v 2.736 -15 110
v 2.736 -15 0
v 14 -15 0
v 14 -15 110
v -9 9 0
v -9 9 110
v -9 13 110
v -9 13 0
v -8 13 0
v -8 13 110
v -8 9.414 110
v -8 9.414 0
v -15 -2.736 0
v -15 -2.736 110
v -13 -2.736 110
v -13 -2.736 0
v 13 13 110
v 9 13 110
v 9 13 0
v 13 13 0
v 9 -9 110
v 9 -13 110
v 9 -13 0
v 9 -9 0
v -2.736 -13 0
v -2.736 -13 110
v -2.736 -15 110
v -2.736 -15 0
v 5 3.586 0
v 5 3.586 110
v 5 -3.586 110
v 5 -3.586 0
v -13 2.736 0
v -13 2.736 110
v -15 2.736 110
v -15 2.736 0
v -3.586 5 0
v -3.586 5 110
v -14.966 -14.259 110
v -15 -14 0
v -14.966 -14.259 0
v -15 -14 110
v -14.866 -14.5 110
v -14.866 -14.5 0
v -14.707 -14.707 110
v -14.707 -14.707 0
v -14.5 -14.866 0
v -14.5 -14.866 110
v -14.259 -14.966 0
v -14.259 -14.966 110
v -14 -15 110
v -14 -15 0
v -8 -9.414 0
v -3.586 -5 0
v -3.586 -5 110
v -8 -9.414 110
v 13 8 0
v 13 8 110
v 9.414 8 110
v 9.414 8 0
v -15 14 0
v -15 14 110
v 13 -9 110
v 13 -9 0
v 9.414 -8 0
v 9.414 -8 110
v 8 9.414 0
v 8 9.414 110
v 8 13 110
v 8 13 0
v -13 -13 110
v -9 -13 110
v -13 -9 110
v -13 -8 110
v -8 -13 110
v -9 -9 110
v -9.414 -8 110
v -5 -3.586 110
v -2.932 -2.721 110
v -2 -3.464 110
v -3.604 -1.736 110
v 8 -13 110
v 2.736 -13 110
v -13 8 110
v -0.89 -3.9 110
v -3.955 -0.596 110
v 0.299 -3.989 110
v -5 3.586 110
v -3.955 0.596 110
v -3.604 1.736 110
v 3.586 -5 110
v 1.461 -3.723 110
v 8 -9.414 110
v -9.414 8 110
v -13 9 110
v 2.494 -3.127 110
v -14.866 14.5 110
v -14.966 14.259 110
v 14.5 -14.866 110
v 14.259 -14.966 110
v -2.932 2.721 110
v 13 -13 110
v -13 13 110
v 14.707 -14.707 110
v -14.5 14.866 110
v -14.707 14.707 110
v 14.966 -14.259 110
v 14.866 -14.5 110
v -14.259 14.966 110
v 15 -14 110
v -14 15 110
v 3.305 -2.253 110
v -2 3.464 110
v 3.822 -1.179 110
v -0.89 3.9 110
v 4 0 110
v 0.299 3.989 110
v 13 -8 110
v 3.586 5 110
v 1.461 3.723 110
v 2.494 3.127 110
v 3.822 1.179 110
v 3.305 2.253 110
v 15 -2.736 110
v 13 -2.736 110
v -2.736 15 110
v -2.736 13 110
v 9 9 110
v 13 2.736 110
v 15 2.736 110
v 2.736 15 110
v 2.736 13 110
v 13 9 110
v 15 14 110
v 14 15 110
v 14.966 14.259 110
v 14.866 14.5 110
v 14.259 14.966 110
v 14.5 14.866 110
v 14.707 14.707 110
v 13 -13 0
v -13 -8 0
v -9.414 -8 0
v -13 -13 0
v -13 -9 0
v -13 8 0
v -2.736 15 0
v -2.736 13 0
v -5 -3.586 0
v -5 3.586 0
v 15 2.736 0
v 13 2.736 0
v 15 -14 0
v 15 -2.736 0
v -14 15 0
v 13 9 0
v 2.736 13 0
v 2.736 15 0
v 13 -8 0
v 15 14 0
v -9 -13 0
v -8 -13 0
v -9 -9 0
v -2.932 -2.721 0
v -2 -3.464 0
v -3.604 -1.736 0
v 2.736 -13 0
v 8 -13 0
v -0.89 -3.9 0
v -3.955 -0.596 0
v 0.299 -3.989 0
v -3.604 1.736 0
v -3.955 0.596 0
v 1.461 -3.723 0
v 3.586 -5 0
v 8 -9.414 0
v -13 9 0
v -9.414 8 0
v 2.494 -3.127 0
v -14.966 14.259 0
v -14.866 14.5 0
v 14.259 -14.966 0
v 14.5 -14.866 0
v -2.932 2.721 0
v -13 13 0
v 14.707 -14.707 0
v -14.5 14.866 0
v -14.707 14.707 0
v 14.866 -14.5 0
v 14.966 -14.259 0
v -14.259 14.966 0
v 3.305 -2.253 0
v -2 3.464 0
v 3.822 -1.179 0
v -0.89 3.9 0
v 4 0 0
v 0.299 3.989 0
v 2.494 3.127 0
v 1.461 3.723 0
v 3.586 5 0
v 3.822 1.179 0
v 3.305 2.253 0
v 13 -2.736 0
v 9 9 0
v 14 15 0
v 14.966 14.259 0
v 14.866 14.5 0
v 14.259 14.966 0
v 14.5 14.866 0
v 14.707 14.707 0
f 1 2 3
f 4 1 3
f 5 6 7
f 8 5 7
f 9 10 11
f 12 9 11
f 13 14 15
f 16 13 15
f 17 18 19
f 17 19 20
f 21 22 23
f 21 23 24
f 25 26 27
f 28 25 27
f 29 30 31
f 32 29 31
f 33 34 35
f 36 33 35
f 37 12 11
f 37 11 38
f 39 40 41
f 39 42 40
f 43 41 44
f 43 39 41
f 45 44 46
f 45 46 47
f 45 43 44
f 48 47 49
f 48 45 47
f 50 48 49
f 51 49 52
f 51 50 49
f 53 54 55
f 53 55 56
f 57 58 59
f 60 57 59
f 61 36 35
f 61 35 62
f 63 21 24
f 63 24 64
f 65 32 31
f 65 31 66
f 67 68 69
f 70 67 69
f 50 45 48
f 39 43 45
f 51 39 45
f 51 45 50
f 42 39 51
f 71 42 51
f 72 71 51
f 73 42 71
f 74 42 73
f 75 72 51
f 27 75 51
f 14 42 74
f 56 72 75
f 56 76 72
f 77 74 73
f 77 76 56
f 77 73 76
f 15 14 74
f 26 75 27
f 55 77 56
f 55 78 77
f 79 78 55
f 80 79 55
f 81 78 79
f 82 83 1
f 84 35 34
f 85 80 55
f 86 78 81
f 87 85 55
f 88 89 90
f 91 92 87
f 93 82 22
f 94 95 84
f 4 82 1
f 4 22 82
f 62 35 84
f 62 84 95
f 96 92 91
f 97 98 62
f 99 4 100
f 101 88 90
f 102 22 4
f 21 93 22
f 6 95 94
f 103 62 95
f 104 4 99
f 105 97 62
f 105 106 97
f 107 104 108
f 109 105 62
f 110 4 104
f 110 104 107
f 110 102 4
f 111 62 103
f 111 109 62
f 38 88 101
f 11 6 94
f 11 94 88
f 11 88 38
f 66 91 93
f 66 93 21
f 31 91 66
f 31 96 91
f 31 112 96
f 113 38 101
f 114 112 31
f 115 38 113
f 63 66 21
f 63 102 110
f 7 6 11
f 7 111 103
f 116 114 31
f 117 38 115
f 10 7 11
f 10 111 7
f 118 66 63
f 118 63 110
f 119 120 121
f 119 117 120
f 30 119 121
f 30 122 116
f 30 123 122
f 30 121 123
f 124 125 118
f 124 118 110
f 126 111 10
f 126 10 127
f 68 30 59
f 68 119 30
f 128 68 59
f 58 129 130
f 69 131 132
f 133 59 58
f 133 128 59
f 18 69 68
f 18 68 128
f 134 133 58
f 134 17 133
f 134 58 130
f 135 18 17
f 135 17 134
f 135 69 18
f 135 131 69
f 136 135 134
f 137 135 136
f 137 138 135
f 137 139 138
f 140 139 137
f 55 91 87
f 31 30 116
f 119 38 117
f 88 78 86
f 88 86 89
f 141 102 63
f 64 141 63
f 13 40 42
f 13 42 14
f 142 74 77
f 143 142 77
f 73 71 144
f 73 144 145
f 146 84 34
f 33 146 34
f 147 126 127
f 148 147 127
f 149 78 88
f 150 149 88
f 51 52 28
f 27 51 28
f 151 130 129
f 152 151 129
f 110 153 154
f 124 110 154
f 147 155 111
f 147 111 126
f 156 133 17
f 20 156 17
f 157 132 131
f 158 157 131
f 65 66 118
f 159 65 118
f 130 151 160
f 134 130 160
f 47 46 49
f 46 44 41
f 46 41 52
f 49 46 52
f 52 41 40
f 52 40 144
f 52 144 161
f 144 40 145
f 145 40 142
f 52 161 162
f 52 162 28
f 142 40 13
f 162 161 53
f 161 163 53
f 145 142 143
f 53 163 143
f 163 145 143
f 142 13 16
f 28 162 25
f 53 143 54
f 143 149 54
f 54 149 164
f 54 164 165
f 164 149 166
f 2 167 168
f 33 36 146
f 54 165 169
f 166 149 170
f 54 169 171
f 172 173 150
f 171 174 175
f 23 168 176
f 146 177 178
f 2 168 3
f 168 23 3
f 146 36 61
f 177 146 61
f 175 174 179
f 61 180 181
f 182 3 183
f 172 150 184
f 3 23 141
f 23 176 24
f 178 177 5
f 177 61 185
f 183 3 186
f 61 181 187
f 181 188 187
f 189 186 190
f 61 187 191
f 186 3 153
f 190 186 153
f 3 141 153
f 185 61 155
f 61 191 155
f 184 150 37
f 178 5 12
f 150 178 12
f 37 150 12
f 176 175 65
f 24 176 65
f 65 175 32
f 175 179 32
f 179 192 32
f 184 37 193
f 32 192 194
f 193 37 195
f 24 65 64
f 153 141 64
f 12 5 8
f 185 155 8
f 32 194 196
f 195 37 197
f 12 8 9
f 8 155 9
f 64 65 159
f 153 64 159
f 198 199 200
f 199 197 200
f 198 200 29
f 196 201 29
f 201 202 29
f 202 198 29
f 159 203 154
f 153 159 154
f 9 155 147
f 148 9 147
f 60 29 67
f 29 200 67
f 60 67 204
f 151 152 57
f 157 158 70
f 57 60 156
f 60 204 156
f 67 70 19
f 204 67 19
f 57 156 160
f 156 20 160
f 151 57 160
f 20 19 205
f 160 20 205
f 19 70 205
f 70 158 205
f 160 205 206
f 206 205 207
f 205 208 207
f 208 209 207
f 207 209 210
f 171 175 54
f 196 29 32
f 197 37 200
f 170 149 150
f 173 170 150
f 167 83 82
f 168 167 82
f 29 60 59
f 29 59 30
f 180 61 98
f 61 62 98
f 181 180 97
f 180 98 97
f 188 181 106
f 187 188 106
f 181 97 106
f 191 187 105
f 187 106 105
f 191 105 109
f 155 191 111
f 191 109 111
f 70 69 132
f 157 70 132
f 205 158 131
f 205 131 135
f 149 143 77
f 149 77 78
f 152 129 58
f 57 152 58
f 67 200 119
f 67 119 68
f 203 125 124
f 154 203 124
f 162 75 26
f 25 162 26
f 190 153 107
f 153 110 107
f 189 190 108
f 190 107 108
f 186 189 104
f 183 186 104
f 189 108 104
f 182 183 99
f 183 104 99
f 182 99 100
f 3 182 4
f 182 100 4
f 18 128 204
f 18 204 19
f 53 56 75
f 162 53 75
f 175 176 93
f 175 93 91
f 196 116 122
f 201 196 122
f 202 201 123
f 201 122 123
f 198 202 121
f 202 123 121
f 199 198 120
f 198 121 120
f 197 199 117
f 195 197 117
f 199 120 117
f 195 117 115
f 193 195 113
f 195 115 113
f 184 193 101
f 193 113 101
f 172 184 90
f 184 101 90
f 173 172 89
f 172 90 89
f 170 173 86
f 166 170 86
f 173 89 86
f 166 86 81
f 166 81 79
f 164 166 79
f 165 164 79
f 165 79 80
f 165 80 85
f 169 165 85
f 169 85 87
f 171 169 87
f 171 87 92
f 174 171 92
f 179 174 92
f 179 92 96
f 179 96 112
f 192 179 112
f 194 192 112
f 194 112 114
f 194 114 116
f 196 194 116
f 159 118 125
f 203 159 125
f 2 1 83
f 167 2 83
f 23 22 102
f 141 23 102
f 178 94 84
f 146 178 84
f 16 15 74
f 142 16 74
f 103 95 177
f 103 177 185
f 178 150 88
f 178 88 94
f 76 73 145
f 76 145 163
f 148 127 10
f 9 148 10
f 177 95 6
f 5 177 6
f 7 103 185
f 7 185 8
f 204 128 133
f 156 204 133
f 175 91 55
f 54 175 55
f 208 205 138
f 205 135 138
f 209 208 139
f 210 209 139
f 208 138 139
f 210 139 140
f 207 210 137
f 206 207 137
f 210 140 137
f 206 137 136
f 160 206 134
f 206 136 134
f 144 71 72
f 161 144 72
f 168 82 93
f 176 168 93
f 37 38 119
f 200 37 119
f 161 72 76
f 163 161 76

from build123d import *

# Parameters (mm, degrees)
SKETCH_1_W          = 30
SKETCH_1_H          = 30
EXTRUDE_1_DEPTH     = 110
SKETCH_2_R          = 4
SKETCH_2_W          = 4
SKETCH_2_H          = 4
CUT_EXTRUDE_1_DEPTH = 113.026782512
FILLET_2_R          = 1


with BuildPart() as part:
    # 草图1 → 凸台-拉伸1 (new body)
    with BuildSketch(Plane.XY):
        Rectangle(SKETCH_1_W, SKETCH_1_H)
    extrude(amount=EXTRUDE_1_DEPTH)

    # 草图2 → 切除-拉伸1 (cut, through all)
    with BuildSketch(Plane.XY.offset(110)):
        Circle(SKETCH_2_R)
        Polygon((-8, 9.414213562), (-3.585786438, 5), (3.585786438, 5), (8, 9.414213562), (8, 13), (2.735613527, 13), (2.735613527, 15), (-2.735613527, 15), (-2.735613527, 13), (-8, 13), align=None)
        Polygon((-5, -3.585786438), (-5, 3.585786438), (-9.414213562, 8), (-13, 8), (-13, 2.735613527), (-15, 2.735613527), (-15, -2.735613527), (-13, -2.735613527), (-13, -8), (-9.414213562, -8), align=None)
        Polygon((3.585786438, -5), (-3.585786438, -5), (-8, -9.414213562), (-8, -13), (-2.735613527, -13), (-2.735613527, -15), (2.735613527, -15), (2.735613527, -13), (8, -13), (8, -9.414213562), align=None)
        Polygon((9.414213562, 8), (5, 3.585786438), (5, -3.585786438), (9.414213562, -8), (13, -8), (13, -2.735613527), (15, -2.735613527), (15, 2.735613527), (13, 2.735613527), (13, 8), align=None)
        with Locations((-11, 11)):
            Rectangle(SKETCH_2_W, SKETCH_2_H)
        with Locations((11, 11)):
            Rectangle(SKETCH_2_W, SKETCH_2_H)
        with Locations((11, -11)):
            Rectangle(SKETCH_2_W, SKETCH_2_H)
        with Locations((-11, -11)):
            Rectangle(SKETCH_2_W, SKETCH_2_H)
    extrude(amount=-CUT_EXTRUDE_1_DEPTH, mode=Mode.SUBTRACT)

    # 圆角2
    fillet_2_edges = [part.edges().sort_by_distance(p)[0] for p in [
        (-15, 15, 55),
        (15, 15, 55),
        (15, -15, 55),
        (-15, -15, 55),
    ]]
    fillet(fillet_2_edges, radius=FILLET_2_R)


solid = part.part
